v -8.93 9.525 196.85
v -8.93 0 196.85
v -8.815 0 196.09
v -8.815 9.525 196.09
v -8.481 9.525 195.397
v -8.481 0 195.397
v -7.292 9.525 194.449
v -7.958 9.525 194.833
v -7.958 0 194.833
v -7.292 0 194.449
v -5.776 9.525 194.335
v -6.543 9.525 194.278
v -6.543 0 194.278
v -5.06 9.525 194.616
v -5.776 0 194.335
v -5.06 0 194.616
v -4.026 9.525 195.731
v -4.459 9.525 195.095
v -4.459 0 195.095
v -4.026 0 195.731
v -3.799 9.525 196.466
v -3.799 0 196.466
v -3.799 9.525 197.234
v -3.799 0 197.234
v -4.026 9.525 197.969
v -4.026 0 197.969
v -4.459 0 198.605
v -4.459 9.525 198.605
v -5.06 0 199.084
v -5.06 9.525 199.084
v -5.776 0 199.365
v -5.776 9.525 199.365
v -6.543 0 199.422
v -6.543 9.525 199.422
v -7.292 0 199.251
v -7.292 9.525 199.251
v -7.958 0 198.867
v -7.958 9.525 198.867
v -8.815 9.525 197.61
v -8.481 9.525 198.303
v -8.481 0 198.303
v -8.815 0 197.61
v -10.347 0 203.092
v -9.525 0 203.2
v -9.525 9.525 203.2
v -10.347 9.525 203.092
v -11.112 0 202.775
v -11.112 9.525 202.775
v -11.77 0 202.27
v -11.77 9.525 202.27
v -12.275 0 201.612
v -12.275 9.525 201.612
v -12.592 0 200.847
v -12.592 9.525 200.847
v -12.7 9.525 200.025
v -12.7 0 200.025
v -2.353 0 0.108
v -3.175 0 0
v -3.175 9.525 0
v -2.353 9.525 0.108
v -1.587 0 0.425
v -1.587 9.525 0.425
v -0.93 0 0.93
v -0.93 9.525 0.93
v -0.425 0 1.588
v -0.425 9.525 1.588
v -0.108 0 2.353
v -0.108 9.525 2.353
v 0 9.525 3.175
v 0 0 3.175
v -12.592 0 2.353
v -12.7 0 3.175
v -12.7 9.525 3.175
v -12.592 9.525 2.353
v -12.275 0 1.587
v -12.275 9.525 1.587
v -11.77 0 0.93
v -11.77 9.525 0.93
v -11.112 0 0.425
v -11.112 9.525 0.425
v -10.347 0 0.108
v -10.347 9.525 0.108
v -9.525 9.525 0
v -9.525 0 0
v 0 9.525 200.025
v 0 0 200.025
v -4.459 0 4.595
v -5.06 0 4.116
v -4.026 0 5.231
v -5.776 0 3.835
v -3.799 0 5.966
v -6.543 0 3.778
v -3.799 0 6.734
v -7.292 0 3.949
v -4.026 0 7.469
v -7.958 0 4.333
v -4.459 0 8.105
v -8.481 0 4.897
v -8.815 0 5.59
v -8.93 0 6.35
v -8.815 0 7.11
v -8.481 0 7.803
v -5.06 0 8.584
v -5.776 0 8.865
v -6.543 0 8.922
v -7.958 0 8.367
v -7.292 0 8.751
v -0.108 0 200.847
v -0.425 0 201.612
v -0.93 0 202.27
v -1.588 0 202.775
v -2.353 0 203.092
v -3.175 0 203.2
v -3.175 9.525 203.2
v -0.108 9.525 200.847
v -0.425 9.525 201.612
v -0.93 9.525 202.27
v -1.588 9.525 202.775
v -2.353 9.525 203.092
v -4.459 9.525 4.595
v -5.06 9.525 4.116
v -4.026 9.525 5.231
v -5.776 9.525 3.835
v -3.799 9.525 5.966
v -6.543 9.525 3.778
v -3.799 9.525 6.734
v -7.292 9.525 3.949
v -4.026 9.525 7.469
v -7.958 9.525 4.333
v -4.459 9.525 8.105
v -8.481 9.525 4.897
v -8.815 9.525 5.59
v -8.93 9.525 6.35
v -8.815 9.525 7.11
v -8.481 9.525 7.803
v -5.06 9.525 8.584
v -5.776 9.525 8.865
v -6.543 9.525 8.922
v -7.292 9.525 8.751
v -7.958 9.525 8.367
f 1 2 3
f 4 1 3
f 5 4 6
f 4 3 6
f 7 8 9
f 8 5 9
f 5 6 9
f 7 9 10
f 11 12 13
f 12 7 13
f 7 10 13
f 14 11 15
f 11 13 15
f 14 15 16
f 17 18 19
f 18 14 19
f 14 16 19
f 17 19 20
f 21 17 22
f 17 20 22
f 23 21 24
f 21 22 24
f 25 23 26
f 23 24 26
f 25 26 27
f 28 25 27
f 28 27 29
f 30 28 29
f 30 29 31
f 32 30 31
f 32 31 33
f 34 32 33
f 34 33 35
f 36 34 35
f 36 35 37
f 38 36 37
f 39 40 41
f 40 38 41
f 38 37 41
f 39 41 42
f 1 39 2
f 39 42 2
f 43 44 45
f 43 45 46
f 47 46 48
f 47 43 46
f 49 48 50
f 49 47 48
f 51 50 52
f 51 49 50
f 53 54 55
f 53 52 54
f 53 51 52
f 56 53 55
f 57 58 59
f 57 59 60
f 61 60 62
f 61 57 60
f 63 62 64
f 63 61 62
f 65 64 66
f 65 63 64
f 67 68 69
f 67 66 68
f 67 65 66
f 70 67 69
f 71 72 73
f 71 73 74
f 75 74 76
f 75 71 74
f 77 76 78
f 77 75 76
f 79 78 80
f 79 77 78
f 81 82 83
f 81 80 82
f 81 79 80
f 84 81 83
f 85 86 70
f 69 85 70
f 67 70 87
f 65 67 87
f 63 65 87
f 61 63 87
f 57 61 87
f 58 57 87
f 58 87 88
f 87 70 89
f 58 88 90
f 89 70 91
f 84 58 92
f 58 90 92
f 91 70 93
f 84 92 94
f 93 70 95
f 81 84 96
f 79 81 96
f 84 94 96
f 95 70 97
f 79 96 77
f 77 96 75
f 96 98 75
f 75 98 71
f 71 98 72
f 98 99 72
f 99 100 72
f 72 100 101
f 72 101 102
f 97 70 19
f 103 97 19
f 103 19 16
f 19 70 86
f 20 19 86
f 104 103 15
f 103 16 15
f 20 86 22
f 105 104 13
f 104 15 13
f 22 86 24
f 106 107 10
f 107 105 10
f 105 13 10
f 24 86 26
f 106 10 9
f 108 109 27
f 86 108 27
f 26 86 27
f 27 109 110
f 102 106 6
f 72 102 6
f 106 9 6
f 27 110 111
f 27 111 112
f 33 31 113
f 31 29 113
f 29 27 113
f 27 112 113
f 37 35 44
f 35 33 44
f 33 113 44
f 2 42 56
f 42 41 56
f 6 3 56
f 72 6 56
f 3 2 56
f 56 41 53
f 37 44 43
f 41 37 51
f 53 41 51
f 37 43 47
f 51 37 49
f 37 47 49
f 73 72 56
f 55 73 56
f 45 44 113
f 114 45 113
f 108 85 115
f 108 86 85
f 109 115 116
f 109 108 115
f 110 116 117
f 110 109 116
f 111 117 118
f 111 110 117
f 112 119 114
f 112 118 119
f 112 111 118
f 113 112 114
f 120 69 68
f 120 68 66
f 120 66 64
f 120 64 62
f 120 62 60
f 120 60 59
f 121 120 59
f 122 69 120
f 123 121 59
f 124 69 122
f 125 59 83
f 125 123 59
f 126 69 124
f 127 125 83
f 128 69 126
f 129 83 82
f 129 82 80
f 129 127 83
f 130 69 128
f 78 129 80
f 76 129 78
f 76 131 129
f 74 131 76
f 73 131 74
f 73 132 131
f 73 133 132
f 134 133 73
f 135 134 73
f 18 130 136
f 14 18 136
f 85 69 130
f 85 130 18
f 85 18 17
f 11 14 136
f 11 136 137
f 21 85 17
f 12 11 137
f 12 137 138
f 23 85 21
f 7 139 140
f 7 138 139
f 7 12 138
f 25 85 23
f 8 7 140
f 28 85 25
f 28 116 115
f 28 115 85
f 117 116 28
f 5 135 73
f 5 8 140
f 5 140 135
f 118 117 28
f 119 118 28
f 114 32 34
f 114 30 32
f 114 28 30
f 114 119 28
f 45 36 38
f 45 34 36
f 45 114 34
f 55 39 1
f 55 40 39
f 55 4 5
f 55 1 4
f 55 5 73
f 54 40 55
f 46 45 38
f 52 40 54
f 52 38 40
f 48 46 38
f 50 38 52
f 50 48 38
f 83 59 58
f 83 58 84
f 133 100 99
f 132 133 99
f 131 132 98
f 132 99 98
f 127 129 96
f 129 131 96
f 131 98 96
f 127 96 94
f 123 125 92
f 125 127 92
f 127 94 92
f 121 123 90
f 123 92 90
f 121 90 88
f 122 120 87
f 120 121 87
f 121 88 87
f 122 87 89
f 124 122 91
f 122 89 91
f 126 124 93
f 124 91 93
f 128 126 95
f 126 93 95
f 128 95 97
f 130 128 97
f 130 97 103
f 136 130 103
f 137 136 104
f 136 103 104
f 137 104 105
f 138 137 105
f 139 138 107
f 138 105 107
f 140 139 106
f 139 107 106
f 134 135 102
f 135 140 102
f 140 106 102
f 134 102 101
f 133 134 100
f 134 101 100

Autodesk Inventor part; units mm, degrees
ref_plane "YZ Plane" through (0, 0, 0) normal (1, 0, 0) x (0, 1, 0)
ref_plane "XZ Plane" through (0, 0, 0) normal (0, 1, 0) x (-1, 0, 0)
ref_plane "XY Plane" through (0, 0, 0) normal (0, 0, 1) x (1, 0, 0)
sketch "Sketch1" plane through (0, 0, 0) normal (0, 1, 0) x (-1, 0, 0)
  line L0 (3.175, 0) -> (9.525, 0)
  line L1 (12.7, 3.175) -> (12.7, 200.025)
  line L2 (9.525, 203.2) -> (3.175, 203.2)
  line L3 (0, 200.025) -> (0, 3.175)
  circle A0 centre (6.35, 196.85) radius 2.5797
  circle A1 centre (6.35, 6.35) radius 2.5797
  arc A2 (12.7, 200.025) -> (9.525, 203.2) centre (9.525, 200.025) ccw
  arc A3 (3.175, 203.2) -> (0, 200.025) centre (3.175, 200.025) ccw
  arc A4 (0, 3.175) -> (3.175, 0) centre (3.175, 3.175) ccw
  arc A5 (9.525, 0) -> (12.7, 3.175) centre (9.525, 3.175) ccw
  point P0 (0, 0)
  point P1 (12.7, 203.2)
  point P2 (0, 203.2)
  dimension "d0" = 12.7
  dimension "d1" = 5.1594
  dimension "d2" = 6.35
  dimension "d3" = 6.35
  dimension "d4" = 6.35
  dimension "d5" = 6.35
  dimension "d6" = 203.2
  dimension "d7" = 3.175
extrude "Extrusion1" add sketch "Sketch1" along normal blind 9.525
equation "\"d2\" = 0.5 * d0"
equation "\"d3\" = d2"
equation "\"d4\" = d2"
equation "\"d5\" = d3"
properties part number "Inner swing"
